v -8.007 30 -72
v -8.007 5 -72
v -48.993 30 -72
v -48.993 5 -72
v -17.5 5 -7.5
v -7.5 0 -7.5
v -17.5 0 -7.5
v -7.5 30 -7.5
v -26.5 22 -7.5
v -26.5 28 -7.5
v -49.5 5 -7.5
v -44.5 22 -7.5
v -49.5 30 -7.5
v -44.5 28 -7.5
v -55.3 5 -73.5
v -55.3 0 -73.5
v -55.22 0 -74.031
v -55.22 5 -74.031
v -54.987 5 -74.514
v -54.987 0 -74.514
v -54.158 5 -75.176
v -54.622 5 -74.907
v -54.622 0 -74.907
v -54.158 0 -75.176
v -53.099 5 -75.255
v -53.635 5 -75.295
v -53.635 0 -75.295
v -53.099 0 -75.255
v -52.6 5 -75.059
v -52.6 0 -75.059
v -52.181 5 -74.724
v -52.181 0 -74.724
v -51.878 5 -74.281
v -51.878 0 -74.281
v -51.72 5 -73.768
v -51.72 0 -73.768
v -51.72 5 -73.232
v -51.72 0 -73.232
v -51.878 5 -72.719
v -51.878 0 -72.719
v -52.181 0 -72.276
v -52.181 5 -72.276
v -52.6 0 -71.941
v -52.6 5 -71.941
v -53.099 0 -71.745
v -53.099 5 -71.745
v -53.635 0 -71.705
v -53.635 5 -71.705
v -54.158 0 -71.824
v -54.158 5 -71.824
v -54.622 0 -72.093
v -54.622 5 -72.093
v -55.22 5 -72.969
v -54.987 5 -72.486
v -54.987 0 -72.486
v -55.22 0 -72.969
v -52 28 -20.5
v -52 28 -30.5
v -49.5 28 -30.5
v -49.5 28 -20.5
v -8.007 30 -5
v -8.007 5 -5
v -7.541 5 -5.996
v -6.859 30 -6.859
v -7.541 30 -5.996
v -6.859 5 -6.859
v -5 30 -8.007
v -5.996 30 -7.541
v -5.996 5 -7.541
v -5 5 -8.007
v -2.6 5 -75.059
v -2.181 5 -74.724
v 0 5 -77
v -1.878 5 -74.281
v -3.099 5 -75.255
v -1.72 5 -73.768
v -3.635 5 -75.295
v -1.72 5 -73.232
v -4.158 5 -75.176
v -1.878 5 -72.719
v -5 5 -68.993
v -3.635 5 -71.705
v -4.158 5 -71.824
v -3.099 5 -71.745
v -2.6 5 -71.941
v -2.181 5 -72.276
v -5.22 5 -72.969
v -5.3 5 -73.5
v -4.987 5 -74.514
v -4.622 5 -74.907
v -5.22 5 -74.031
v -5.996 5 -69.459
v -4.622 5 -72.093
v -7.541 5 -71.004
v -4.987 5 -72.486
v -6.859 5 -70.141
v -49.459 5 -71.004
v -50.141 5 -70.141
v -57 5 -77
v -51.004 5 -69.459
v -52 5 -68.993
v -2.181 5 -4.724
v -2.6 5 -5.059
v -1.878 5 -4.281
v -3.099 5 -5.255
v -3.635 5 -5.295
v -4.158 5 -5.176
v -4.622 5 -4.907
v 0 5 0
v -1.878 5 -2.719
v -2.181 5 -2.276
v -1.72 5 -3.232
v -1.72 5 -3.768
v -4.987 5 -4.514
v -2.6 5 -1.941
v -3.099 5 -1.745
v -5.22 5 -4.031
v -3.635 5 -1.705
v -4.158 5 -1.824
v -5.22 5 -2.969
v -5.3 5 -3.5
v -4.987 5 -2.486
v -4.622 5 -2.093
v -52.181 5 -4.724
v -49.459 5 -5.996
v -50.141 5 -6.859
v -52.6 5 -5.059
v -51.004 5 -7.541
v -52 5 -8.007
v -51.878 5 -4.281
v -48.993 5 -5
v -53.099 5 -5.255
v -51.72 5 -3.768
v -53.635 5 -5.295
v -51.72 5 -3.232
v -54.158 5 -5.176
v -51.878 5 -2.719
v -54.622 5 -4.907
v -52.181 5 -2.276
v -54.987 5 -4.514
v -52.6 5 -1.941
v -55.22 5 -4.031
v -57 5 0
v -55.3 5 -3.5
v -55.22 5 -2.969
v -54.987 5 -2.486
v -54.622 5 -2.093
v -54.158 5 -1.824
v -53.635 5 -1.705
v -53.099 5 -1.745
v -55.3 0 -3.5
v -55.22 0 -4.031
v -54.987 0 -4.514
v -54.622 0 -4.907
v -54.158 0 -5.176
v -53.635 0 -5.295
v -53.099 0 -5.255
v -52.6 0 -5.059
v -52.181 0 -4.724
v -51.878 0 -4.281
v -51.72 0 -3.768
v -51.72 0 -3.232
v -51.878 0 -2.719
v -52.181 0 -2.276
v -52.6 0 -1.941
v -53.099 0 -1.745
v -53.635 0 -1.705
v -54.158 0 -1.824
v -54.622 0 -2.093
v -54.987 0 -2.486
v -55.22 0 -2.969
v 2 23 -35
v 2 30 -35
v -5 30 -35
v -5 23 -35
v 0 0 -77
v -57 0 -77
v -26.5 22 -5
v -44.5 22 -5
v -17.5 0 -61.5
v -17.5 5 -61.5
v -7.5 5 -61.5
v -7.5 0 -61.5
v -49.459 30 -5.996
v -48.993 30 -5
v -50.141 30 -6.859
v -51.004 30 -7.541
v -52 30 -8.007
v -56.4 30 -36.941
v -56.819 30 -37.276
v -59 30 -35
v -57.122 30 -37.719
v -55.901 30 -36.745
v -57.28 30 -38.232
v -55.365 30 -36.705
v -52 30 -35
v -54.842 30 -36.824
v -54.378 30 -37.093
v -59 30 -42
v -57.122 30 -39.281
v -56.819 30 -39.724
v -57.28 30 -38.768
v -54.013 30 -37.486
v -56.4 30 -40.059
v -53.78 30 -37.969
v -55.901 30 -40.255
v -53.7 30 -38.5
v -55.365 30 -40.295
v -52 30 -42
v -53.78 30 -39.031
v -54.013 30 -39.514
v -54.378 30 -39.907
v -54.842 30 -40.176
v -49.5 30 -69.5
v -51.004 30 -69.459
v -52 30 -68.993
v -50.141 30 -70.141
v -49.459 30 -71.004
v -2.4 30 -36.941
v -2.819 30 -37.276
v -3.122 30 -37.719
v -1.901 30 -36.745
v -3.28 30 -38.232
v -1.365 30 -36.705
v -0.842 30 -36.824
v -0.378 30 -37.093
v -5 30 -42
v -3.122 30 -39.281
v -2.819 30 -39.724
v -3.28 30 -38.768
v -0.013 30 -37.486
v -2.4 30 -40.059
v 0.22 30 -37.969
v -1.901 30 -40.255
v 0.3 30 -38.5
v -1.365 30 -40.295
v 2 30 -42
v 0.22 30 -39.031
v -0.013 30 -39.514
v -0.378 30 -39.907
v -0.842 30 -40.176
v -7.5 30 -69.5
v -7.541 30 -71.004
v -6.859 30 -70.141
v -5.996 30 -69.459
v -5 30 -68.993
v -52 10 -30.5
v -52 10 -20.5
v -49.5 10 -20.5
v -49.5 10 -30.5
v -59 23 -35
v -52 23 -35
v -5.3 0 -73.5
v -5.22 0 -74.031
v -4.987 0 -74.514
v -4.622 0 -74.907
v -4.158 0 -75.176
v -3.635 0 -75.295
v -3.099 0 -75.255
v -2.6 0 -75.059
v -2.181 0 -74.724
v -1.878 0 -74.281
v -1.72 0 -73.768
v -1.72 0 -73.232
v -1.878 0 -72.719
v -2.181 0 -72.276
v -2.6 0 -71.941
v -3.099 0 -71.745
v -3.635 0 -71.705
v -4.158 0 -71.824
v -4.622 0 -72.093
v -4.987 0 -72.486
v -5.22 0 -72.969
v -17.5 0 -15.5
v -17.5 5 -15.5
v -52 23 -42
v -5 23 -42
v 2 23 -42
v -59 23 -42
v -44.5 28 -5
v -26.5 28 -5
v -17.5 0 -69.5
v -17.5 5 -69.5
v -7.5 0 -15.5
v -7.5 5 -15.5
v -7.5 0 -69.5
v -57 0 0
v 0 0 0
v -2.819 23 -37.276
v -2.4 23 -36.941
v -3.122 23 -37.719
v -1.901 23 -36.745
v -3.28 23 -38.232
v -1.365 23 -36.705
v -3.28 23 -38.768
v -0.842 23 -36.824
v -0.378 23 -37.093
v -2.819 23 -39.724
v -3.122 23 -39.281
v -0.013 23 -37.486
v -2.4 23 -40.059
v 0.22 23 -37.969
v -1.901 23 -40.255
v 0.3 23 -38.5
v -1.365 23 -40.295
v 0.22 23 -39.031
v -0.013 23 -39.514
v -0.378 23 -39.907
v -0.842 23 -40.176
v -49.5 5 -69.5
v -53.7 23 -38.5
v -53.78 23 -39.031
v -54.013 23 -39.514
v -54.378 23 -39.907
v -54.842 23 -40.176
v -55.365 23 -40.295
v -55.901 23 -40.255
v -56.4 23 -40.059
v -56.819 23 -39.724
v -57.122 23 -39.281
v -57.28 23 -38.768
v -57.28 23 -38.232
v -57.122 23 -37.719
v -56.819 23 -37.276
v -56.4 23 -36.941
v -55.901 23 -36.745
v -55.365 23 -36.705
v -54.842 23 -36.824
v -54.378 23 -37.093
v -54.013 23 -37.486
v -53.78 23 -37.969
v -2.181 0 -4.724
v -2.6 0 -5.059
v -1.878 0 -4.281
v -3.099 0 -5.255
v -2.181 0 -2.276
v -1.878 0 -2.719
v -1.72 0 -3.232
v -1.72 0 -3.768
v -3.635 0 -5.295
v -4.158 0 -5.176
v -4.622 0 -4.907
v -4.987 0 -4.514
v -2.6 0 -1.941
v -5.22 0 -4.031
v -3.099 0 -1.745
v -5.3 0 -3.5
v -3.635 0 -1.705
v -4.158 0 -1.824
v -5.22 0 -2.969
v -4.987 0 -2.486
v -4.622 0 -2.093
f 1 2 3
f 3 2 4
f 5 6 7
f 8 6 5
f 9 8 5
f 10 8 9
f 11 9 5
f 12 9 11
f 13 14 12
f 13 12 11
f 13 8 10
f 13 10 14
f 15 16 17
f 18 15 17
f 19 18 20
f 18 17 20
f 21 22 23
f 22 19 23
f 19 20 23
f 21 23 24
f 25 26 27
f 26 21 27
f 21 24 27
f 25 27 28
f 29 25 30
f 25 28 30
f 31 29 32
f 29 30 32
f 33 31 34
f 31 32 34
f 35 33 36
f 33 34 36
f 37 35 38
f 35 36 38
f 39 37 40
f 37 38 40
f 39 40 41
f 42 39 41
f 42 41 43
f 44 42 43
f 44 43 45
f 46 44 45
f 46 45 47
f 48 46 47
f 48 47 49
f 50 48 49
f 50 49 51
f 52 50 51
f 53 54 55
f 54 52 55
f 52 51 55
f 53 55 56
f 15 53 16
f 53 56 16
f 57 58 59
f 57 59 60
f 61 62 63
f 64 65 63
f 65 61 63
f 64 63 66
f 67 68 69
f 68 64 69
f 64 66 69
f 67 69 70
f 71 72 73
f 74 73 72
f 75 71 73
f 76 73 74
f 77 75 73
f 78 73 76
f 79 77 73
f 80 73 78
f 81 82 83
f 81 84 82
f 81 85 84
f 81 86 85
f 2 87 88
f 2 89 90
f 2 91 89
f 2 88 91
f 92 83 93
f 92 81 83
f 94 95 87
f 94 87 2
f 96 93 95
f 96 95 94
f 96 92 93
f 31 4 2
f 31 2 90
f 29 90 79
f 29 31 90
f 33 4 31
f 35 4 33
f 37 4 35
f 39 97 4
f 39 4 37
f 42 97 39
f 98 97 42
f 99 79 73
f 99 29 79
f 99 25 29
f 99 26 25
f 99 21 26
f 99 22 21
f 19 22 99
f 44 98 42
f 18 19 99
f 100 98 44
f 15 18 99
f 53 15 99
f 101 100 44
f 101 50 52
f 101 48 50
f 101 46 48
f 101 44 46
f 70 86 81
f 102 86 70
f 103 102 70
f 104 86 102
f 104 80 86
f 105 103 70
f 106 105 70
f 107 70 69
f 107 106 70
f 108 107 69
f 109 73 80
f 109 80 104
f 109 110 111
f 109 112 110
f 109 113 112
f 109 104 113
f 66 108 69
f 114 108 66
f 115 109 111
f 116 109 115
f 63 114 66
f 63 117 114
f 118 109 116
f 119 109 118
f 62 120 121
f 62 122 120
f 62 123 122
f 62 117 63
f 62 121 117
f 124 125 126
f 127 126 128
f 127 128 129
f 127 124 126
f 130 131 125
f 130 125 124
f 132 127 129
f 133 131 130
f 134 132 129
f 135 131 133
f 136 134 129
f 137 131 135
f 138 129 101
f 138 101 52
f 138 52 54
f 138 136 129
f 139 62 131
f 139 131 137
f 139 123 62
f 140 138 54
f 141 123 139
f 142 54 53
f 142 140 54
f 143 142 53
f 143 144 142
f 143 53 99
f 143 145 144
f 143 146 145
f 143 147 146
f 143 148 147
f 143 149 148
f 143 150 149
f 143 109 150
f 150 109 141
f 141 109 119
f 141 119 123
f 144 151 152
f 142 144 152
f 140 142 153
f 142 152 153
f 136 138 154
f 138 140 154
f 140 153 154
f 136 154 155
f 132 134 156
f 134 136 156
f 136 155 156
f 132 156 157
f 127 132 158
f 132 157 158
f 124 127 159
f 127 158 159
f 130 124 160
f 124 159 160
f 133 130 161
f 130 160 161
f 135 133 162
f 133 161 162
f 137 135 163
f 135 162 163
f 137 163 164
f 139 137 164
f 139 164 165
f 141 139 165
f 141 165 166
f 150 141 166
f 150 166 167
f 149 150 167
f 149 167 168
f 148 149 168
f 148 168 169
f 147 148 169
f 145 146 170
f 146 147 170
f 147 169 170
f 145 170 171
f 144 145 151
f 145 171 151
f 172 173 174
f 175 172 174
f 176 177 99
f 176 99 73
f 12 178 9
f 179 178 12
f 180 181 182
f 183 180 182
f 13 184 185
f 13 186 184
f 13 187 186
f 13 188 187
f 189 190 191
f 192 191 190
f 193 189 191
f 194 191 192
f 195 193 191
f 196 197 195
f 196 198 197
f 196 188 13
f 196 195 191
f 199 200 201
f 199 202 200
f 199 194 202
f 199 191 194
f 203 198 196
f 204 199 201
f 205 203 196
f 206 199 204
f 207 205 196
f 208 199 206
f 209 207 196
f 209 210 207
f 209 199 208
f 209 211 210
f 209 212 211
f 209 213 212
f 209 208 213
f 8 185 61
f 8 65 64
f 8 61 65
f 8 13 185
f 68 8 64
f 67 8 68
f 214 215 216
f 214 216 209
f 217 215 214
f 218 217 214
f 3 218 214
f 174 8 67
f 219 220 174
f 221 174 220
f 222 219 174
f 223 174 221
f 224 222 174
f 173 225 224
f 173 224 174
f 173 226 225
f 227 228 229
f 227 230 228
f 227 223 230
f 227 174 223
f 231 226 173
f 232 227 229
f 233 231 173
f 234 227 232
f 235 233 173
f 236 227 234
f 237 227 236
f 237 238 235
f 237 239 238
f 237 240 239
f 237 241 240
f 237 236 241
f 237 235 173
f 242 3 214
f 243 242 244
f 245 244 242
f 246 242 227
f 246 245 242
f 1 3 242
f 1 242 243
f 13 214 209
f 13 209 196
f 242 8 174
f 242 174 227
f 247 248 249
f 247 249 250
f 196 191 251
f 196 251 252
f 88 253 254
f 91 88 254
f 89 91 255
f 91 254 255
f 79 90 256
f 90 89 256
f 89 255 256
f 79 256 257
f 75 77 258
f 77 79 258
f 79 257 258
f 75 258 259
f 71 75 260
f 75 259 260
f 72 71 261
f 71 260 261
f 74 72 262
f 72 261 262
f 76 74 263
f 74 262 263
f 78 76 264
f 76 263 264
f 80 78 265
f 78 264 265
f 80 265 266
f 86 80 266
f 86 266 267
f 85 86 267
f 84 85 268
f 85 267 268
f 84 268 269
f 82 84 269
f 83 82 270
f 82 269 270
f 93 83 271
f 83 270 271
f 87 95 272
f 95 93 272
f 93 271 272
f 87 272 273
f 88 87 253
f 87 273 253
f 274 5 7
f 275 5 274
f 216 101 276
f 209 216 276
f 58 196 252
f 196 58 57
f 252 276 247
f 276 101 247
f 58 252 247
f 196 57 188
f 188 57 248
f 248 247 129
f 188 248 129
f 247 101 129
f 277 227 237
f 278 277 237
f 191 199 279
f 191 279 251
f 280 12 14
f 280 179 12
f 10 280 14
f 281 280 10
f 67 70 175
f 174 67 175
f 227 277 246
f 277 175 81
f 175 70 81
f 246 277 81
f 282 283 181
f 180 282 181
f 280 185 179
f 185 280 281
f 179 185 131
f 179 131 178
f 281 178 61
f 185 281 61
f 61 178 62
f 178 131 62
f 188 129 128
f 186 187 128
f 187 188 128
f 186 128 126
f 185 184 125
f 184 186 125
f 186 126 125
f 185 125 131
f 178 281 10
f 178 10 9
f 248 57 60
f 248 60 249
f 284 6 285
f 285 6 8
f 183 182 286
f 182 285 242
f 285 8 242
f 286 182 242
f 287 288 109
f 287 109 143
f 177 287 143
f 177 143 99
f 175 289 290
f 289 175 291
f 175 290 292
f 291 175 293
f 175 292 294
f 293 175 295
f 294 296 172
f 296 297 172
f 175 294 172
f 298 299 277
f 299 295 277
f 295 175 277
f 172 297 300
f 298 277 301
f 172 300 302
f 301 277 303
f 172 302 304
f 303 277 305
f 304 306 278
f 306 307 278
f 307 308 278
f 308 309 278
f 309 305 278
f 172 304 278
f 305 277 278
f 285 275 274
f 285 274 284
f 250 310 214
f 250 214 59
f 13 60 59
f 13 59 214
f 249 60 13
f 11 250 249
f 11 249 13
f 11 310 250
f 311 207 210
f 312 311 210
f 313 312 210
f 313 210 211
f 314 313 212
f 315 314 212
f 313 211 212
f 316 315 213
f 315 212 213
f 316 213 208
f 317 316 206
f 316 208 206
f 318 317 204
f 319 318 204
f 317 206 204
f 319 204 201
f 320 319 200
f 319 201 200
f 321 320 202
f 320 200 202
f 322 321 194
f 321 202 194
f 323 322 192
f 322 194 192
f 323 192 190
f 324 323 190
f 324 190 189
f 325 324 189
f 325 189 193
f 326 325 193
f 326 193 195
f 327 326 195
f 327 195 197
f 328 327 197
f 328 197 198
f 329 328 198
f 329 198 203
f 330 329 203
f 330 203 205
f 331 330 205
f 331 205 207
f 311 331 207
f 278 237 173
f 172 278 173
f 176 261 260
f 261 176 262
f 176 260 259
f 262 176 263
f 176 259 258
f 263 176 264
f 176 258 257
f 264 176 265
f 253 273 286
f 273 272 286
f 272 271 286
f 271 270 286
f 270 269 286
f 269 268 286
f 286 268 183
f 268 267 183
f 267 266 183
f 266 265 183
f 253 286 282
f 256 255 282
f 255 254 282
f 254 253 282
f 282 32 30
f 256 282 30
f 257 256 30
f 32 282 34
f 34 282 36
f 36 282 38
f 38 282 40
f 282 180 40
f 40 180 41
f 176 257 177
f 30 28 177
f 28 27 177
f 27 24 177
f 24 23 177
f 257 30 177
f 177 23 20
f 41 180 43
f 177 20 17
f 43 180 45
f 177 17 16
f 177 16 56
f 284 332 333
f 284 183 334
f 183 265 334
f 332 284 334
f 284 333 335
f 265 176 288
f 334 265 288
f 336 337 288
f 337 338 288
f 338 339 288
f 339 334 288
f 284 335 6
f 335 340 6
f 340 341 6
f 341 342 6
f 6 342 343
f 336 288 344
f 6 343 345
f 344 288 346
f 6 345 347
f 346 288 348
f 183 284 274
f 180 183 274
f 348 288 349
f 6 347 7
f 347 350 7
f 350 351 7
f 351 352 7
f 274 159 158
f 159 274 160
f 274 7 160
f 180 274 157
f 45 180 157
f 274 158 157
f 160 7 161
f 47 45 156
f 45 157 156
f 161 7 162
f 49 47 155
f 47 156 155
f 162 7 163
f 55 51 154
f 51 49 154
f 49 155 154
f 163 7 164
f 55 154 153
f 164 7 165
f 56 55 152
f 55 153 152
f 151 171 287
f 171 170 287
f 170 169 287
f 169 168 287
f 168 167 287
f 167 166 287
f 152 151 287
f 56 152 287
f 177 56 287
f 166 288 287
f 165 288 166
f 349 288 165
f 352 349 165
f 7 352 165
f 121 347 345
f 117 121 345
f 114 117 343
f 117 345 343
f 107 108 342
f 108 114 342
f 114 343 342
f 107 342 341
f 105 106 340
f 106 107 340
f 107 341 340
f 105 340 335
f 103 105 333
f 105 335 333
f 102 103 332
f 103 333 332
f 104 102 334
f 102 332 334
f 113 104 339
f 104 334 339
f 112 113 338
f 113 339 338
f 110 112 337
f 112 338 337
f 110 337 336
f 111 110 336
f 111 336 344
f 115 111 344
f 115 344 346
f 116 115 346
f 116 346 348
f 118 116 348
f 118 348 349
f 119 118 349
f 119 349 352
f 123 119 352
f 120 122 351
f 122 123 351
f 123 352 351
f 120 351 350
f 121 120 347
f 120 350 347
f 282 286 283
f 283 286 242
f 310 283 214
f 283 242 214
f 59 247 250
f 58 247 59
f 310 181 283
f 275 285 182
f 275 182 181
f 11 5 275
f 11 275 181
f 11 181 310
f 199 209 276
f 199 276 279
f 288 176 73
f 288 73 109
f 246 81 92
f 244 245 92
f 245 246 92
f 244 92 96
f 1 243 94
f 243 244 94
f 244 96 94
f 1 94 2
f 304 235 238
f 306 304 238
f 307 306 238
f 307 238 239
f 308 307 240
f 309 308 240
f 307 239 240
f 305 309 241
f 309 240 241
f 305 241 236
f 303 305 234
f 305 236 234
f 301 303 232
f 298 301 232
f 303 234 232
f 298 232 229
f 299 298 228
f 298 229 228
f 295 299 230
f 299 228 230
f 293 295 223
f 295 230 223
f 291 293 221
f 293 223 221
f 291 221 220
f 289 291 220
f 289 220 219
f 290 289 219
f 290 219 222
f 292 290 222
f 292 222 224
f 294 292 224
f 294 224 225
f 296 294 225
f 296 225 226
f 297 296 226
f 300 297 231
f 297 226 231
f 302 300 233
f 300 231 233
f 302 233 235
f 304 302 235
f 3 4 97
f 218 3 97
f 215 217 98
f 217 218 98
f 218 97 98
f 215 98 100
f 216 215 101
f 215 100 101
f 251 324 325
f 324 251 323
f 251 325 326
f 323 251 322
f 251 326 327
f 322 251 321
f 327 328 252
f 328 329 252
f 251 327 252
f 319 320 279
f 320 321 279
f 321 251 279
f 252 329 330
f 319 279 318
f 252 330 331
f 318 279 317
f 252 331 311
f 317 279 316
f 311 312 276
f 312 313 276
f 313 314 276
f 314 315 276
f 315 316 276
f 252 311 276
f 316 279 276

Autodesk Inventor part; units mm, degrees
ref_plane "YZ Plane" through (0, 0, 0) normal (1, 0, 0) x (0, 1, 0)
ref_plane "XZ Plane" through (0, 0, 0) normal (0, 1, 0) x (-1, 0, 0)
ref_plane "XY Plane" through (0, 0, 0) normal (0, 0, 1) x (1, 0, 0)
sketch "Sketch1" plane through (0, 0, 0) normal (0, 1, 0) x (-1, 0, 0)
  line L0 (0, 0) -> (57, 0)
  line L1 (57, 0) -> (57, -77)
  line L2 (57, -77) -> (0, -77)
  line L3 (0, -77) -> (0, 0)
  line L4 (53.5, -3.5) -> (3.5, -3.5) construction
  line L5 (3.5, -3.5) -> (3.5, -73.5) construction
  line L6 (3.5, -73.5) -> (53.5, -73.5) construction
  line L7 (53.5, -73.5) -> (53.5, -3.5) construction
  line L8 (52, -5) -> (5, -5)
  line L9 (5, -5) -> (5, -72)
  line L10 (5, -72) -> (52, -72)
  line L11 (52, -72) -> (52, -5)
  circle A0 centre (53.5, -3.5) radius 1.8
  circle A1 centre (53.5, -73.5) radius 1.8
  circle A2 centre (3.5, -3.5) radius 1.8
  circle A3 centre (3.5, -73.5) radius 1.8
  dimension "d0" = 57
  dimension "d1" = 77
  dimension "d2" = 50
  dimension "d3" = 70
  dimension "d4" = 3.5
  dimension "d5" = 3.5
  dimension "d6" = 67
  dimension "d7" = 47
  dimension "d8" = 1.5
  dimension "d9" = 1.5
  dimension "d10" = 3.6
  dimension "d11" = 3.6
  dimension "d12" = 3.6
  dimension "d13" = 3.6
extrude "Extrusion1" add sketch "Sketch1" along normal blind 5 contours L0 L1 L2 L3 | L11 L10 L9 L8
sketch "Sketch3" plane through (0, 5, 0) normal (0, 1, 0) x (1, 0, 0)
  line L0 (-52, 5) -> (-5, 5)
  line L1 (-5, 5) -> (-5, 72)
  line L2 (-5, 72) -> (-52, 72)
  line L3 (-52, 72) -> (-52, 5)
  line L4 (-57, 77) -> (-57, 0) projected
  line L5 (-57, 0) -> (0, 0) projected
  circle A0 centre (-53.5, 3.5) radius 1.8 construction
  circle A1 centre (-53.5, 3.5) radius 4.75
  circle A2 centre (-53.5, 73.5) radius 1.8 construction
  circle A3 centre (-53.5, 73.5) radius 4.75
  circle A4 centre (-3.5, 3.5) radius 1.8 construction
  circle A5 centre (-3.5, 3.5) radius 4.75
  circle A6 centre (-3.5, 73.5) radius 1.8 construction
  circle A7 centre (-3.5, 73.5) radius 4.75
  line L6 (-49.5, 7.5) -> (-7.5, 7.5)
  line L7 (-7.5, 7.5) -> (-7.5, 69.5)
  line L8 (-7.5, 69.5) -> (-49.5, 69.5)
  line L9 (-49.5, 69.5) -> (-49.5, 7.5)
  point P0 (-5, 68.9931)
  point P1 (-8.0069, 72)
  point P2 (-48.9931, 72)
  point P3 (-52, 68.9931)
  point P4 (-52, 8.0069)
  point P5 (-48.9931, 5)
  point P6 (-8.0069, 5)
  point P7 (-5, 8.0069)
  dimension "d30" = 47
  dimension "d31" = 67
  dimension "d32" = 5
  dimension "d33" = 5
  dimension "d34" = 9.5
  dimension "d35" = 9.5
  dimension "d36" = 9.5
  dimension "d37" = 9.5
  dimension "d38" = 42
  dimension "d39" = 62
  dimension "d40" = 2.5
  dimension "d41" = 2.5
extrude "Extrusion2" add sketch "Sketch3" along normal blind 25 contours A1 L3 A3 L2 A7 L1 A5 L0
sketch "Sketch4" plane through (-48.9931, 5, -5) normal (0, 0, 1) x (1, 0, 0)
  line L0 (4.4931, 23) -> (22.4931, 23)
  line L1 (22.4931, 23) -> (22.4931, 17)
  line L2 (22.4931, 17) -> (4.4931, 17)
  line L3 (4.4931, 17) -> (4.4931, 23)
  line L4 (43.9931, 0) -> (43.9931, 25) projected
  line L5 (-8.0069, 0) -> (48.9931, 0) projected
  point P0 (48.9931, -5)
  dimension "d44" = 18
  dimension "d45" = 6
  dimension "d46" = 21.5
  dimension "d47" = 17
extrude "Extrusion3" cut sketch "Sketch4" against normal blind 10
sketch "Sketch5" plane through (0, 30, 0) normal (0, 1, 0) x (1, 0, 0)
  line L0 (-5, 68.9931) -> (-5, 8.0069) projected
  line L1 (-5, 42) -> (2, 42)
  line L2 (2, 42) -> (2, 35)
  line L3 (2, 35) -> (-5, 35)
  line L4 (-5, 35) -> (-5, 42)
  line L5 (-8.0069, 72) -> (-48.9931, 72) projected
  line L6 (0, 77) -> (-57, 77) construction
  line L7 (-28.5, 77) -> (-28.5, 0) construction
  line L8 (-57, 0) -> (0, 0) construction
  line L9 (-5, 38.5) -> (2, 38.5) construction
  line L10 (-1.5, 42) -> (-1.5, 35) construction
  circle A0 centre (-1.5, 38.5) radius 1.8
  line L11 (-52, 42) -> (-59, 42)
  line L12 (-59, 42) -> (-59, 35)
  line L13 (-59, 35) -> (-52, 35)
  line L14 (-52, 35) -> (-52, 42)
  line L15 (-52, 38.5) -> (-59, 38.5) construction
  line L16 (-55.5, 42) -> (-55.5, 35) construction
  circle A1 centre (-55.5, 38.5) radius 1.8
  dimension "d50" = 7
  dimension "d51" = 7
  dimension "d52" = 30
  dimension "d53" = 3.6
extrude "Extrusion4" add sketch "Sketch5" against normal blind 7
sketch "Sketch6" plane through (-52, 5, -68.9931) normal (-1, 0, 0) x (0, 0, 1)
  line L0 (38.4931, 23) -> (48.4931, 23)
  line L1 (48.4931, 23) -> (48.4931, 5)
  line L2 (48.4931, 5) -> (38.4931, 5)
  line L3 (38.4931, 5) -> (38.4931, 23)
  line L4 (63.9931, 0) -> (63.9931, 25) projected
  line L5 (33.9931, 25) -> (60.9861, 25) projected
  line L6 (60.9861, 0) -> (0, 0) projected
  point P0 (68.9931, -5)
  dimension "d56" = 15.5
  dimension "d57" = 10
  dimension "d58" = 2
  dimension "d59" = 5
extrude "Extrusion5" cut sketch "Sketch6" against normal blind 25
sketch "Sketch8" plane through (0, 5, 0) normal (0, 1, 0) x (1, 0, 0)
  line L0 (-7.5, 7.5) -> (-7.5, 69.5) projected
  line L1 (-7.5, 7.5) -> (-17.5, 7.5)
  line L2 (-17.5, 7.5) -> (-17.5, 15.5)
  line L3 (-17.5, 15.5) -> (-7.5, 15.5)
  line L4 (-7.5, 15.5) -> (-7.5, 7.5)
  line L5 (-7.5, 69.5) -> (-7.5, 7.5) projected
  line L6 (-7.5, 69.5) -> (-17.5, 69.5)
  line L7 (-17.5, 69.5) -> (-17.5, 61.5)
  line L8 (-17.5, 61.5) -> (-7.5, 61.5)
  line L9 (-7.5, 61.5) -> (-7.5, 69.5)
  point P0 (0, 0)
  dimension "d64" = 10
  dimension "d65" = 8
  dimension "d68" = 10
  dimension "d69" = 8
extrude "Extrusion6" cut sketch "Sketch8" against normal blind 10
properties part number "ESPBox"
